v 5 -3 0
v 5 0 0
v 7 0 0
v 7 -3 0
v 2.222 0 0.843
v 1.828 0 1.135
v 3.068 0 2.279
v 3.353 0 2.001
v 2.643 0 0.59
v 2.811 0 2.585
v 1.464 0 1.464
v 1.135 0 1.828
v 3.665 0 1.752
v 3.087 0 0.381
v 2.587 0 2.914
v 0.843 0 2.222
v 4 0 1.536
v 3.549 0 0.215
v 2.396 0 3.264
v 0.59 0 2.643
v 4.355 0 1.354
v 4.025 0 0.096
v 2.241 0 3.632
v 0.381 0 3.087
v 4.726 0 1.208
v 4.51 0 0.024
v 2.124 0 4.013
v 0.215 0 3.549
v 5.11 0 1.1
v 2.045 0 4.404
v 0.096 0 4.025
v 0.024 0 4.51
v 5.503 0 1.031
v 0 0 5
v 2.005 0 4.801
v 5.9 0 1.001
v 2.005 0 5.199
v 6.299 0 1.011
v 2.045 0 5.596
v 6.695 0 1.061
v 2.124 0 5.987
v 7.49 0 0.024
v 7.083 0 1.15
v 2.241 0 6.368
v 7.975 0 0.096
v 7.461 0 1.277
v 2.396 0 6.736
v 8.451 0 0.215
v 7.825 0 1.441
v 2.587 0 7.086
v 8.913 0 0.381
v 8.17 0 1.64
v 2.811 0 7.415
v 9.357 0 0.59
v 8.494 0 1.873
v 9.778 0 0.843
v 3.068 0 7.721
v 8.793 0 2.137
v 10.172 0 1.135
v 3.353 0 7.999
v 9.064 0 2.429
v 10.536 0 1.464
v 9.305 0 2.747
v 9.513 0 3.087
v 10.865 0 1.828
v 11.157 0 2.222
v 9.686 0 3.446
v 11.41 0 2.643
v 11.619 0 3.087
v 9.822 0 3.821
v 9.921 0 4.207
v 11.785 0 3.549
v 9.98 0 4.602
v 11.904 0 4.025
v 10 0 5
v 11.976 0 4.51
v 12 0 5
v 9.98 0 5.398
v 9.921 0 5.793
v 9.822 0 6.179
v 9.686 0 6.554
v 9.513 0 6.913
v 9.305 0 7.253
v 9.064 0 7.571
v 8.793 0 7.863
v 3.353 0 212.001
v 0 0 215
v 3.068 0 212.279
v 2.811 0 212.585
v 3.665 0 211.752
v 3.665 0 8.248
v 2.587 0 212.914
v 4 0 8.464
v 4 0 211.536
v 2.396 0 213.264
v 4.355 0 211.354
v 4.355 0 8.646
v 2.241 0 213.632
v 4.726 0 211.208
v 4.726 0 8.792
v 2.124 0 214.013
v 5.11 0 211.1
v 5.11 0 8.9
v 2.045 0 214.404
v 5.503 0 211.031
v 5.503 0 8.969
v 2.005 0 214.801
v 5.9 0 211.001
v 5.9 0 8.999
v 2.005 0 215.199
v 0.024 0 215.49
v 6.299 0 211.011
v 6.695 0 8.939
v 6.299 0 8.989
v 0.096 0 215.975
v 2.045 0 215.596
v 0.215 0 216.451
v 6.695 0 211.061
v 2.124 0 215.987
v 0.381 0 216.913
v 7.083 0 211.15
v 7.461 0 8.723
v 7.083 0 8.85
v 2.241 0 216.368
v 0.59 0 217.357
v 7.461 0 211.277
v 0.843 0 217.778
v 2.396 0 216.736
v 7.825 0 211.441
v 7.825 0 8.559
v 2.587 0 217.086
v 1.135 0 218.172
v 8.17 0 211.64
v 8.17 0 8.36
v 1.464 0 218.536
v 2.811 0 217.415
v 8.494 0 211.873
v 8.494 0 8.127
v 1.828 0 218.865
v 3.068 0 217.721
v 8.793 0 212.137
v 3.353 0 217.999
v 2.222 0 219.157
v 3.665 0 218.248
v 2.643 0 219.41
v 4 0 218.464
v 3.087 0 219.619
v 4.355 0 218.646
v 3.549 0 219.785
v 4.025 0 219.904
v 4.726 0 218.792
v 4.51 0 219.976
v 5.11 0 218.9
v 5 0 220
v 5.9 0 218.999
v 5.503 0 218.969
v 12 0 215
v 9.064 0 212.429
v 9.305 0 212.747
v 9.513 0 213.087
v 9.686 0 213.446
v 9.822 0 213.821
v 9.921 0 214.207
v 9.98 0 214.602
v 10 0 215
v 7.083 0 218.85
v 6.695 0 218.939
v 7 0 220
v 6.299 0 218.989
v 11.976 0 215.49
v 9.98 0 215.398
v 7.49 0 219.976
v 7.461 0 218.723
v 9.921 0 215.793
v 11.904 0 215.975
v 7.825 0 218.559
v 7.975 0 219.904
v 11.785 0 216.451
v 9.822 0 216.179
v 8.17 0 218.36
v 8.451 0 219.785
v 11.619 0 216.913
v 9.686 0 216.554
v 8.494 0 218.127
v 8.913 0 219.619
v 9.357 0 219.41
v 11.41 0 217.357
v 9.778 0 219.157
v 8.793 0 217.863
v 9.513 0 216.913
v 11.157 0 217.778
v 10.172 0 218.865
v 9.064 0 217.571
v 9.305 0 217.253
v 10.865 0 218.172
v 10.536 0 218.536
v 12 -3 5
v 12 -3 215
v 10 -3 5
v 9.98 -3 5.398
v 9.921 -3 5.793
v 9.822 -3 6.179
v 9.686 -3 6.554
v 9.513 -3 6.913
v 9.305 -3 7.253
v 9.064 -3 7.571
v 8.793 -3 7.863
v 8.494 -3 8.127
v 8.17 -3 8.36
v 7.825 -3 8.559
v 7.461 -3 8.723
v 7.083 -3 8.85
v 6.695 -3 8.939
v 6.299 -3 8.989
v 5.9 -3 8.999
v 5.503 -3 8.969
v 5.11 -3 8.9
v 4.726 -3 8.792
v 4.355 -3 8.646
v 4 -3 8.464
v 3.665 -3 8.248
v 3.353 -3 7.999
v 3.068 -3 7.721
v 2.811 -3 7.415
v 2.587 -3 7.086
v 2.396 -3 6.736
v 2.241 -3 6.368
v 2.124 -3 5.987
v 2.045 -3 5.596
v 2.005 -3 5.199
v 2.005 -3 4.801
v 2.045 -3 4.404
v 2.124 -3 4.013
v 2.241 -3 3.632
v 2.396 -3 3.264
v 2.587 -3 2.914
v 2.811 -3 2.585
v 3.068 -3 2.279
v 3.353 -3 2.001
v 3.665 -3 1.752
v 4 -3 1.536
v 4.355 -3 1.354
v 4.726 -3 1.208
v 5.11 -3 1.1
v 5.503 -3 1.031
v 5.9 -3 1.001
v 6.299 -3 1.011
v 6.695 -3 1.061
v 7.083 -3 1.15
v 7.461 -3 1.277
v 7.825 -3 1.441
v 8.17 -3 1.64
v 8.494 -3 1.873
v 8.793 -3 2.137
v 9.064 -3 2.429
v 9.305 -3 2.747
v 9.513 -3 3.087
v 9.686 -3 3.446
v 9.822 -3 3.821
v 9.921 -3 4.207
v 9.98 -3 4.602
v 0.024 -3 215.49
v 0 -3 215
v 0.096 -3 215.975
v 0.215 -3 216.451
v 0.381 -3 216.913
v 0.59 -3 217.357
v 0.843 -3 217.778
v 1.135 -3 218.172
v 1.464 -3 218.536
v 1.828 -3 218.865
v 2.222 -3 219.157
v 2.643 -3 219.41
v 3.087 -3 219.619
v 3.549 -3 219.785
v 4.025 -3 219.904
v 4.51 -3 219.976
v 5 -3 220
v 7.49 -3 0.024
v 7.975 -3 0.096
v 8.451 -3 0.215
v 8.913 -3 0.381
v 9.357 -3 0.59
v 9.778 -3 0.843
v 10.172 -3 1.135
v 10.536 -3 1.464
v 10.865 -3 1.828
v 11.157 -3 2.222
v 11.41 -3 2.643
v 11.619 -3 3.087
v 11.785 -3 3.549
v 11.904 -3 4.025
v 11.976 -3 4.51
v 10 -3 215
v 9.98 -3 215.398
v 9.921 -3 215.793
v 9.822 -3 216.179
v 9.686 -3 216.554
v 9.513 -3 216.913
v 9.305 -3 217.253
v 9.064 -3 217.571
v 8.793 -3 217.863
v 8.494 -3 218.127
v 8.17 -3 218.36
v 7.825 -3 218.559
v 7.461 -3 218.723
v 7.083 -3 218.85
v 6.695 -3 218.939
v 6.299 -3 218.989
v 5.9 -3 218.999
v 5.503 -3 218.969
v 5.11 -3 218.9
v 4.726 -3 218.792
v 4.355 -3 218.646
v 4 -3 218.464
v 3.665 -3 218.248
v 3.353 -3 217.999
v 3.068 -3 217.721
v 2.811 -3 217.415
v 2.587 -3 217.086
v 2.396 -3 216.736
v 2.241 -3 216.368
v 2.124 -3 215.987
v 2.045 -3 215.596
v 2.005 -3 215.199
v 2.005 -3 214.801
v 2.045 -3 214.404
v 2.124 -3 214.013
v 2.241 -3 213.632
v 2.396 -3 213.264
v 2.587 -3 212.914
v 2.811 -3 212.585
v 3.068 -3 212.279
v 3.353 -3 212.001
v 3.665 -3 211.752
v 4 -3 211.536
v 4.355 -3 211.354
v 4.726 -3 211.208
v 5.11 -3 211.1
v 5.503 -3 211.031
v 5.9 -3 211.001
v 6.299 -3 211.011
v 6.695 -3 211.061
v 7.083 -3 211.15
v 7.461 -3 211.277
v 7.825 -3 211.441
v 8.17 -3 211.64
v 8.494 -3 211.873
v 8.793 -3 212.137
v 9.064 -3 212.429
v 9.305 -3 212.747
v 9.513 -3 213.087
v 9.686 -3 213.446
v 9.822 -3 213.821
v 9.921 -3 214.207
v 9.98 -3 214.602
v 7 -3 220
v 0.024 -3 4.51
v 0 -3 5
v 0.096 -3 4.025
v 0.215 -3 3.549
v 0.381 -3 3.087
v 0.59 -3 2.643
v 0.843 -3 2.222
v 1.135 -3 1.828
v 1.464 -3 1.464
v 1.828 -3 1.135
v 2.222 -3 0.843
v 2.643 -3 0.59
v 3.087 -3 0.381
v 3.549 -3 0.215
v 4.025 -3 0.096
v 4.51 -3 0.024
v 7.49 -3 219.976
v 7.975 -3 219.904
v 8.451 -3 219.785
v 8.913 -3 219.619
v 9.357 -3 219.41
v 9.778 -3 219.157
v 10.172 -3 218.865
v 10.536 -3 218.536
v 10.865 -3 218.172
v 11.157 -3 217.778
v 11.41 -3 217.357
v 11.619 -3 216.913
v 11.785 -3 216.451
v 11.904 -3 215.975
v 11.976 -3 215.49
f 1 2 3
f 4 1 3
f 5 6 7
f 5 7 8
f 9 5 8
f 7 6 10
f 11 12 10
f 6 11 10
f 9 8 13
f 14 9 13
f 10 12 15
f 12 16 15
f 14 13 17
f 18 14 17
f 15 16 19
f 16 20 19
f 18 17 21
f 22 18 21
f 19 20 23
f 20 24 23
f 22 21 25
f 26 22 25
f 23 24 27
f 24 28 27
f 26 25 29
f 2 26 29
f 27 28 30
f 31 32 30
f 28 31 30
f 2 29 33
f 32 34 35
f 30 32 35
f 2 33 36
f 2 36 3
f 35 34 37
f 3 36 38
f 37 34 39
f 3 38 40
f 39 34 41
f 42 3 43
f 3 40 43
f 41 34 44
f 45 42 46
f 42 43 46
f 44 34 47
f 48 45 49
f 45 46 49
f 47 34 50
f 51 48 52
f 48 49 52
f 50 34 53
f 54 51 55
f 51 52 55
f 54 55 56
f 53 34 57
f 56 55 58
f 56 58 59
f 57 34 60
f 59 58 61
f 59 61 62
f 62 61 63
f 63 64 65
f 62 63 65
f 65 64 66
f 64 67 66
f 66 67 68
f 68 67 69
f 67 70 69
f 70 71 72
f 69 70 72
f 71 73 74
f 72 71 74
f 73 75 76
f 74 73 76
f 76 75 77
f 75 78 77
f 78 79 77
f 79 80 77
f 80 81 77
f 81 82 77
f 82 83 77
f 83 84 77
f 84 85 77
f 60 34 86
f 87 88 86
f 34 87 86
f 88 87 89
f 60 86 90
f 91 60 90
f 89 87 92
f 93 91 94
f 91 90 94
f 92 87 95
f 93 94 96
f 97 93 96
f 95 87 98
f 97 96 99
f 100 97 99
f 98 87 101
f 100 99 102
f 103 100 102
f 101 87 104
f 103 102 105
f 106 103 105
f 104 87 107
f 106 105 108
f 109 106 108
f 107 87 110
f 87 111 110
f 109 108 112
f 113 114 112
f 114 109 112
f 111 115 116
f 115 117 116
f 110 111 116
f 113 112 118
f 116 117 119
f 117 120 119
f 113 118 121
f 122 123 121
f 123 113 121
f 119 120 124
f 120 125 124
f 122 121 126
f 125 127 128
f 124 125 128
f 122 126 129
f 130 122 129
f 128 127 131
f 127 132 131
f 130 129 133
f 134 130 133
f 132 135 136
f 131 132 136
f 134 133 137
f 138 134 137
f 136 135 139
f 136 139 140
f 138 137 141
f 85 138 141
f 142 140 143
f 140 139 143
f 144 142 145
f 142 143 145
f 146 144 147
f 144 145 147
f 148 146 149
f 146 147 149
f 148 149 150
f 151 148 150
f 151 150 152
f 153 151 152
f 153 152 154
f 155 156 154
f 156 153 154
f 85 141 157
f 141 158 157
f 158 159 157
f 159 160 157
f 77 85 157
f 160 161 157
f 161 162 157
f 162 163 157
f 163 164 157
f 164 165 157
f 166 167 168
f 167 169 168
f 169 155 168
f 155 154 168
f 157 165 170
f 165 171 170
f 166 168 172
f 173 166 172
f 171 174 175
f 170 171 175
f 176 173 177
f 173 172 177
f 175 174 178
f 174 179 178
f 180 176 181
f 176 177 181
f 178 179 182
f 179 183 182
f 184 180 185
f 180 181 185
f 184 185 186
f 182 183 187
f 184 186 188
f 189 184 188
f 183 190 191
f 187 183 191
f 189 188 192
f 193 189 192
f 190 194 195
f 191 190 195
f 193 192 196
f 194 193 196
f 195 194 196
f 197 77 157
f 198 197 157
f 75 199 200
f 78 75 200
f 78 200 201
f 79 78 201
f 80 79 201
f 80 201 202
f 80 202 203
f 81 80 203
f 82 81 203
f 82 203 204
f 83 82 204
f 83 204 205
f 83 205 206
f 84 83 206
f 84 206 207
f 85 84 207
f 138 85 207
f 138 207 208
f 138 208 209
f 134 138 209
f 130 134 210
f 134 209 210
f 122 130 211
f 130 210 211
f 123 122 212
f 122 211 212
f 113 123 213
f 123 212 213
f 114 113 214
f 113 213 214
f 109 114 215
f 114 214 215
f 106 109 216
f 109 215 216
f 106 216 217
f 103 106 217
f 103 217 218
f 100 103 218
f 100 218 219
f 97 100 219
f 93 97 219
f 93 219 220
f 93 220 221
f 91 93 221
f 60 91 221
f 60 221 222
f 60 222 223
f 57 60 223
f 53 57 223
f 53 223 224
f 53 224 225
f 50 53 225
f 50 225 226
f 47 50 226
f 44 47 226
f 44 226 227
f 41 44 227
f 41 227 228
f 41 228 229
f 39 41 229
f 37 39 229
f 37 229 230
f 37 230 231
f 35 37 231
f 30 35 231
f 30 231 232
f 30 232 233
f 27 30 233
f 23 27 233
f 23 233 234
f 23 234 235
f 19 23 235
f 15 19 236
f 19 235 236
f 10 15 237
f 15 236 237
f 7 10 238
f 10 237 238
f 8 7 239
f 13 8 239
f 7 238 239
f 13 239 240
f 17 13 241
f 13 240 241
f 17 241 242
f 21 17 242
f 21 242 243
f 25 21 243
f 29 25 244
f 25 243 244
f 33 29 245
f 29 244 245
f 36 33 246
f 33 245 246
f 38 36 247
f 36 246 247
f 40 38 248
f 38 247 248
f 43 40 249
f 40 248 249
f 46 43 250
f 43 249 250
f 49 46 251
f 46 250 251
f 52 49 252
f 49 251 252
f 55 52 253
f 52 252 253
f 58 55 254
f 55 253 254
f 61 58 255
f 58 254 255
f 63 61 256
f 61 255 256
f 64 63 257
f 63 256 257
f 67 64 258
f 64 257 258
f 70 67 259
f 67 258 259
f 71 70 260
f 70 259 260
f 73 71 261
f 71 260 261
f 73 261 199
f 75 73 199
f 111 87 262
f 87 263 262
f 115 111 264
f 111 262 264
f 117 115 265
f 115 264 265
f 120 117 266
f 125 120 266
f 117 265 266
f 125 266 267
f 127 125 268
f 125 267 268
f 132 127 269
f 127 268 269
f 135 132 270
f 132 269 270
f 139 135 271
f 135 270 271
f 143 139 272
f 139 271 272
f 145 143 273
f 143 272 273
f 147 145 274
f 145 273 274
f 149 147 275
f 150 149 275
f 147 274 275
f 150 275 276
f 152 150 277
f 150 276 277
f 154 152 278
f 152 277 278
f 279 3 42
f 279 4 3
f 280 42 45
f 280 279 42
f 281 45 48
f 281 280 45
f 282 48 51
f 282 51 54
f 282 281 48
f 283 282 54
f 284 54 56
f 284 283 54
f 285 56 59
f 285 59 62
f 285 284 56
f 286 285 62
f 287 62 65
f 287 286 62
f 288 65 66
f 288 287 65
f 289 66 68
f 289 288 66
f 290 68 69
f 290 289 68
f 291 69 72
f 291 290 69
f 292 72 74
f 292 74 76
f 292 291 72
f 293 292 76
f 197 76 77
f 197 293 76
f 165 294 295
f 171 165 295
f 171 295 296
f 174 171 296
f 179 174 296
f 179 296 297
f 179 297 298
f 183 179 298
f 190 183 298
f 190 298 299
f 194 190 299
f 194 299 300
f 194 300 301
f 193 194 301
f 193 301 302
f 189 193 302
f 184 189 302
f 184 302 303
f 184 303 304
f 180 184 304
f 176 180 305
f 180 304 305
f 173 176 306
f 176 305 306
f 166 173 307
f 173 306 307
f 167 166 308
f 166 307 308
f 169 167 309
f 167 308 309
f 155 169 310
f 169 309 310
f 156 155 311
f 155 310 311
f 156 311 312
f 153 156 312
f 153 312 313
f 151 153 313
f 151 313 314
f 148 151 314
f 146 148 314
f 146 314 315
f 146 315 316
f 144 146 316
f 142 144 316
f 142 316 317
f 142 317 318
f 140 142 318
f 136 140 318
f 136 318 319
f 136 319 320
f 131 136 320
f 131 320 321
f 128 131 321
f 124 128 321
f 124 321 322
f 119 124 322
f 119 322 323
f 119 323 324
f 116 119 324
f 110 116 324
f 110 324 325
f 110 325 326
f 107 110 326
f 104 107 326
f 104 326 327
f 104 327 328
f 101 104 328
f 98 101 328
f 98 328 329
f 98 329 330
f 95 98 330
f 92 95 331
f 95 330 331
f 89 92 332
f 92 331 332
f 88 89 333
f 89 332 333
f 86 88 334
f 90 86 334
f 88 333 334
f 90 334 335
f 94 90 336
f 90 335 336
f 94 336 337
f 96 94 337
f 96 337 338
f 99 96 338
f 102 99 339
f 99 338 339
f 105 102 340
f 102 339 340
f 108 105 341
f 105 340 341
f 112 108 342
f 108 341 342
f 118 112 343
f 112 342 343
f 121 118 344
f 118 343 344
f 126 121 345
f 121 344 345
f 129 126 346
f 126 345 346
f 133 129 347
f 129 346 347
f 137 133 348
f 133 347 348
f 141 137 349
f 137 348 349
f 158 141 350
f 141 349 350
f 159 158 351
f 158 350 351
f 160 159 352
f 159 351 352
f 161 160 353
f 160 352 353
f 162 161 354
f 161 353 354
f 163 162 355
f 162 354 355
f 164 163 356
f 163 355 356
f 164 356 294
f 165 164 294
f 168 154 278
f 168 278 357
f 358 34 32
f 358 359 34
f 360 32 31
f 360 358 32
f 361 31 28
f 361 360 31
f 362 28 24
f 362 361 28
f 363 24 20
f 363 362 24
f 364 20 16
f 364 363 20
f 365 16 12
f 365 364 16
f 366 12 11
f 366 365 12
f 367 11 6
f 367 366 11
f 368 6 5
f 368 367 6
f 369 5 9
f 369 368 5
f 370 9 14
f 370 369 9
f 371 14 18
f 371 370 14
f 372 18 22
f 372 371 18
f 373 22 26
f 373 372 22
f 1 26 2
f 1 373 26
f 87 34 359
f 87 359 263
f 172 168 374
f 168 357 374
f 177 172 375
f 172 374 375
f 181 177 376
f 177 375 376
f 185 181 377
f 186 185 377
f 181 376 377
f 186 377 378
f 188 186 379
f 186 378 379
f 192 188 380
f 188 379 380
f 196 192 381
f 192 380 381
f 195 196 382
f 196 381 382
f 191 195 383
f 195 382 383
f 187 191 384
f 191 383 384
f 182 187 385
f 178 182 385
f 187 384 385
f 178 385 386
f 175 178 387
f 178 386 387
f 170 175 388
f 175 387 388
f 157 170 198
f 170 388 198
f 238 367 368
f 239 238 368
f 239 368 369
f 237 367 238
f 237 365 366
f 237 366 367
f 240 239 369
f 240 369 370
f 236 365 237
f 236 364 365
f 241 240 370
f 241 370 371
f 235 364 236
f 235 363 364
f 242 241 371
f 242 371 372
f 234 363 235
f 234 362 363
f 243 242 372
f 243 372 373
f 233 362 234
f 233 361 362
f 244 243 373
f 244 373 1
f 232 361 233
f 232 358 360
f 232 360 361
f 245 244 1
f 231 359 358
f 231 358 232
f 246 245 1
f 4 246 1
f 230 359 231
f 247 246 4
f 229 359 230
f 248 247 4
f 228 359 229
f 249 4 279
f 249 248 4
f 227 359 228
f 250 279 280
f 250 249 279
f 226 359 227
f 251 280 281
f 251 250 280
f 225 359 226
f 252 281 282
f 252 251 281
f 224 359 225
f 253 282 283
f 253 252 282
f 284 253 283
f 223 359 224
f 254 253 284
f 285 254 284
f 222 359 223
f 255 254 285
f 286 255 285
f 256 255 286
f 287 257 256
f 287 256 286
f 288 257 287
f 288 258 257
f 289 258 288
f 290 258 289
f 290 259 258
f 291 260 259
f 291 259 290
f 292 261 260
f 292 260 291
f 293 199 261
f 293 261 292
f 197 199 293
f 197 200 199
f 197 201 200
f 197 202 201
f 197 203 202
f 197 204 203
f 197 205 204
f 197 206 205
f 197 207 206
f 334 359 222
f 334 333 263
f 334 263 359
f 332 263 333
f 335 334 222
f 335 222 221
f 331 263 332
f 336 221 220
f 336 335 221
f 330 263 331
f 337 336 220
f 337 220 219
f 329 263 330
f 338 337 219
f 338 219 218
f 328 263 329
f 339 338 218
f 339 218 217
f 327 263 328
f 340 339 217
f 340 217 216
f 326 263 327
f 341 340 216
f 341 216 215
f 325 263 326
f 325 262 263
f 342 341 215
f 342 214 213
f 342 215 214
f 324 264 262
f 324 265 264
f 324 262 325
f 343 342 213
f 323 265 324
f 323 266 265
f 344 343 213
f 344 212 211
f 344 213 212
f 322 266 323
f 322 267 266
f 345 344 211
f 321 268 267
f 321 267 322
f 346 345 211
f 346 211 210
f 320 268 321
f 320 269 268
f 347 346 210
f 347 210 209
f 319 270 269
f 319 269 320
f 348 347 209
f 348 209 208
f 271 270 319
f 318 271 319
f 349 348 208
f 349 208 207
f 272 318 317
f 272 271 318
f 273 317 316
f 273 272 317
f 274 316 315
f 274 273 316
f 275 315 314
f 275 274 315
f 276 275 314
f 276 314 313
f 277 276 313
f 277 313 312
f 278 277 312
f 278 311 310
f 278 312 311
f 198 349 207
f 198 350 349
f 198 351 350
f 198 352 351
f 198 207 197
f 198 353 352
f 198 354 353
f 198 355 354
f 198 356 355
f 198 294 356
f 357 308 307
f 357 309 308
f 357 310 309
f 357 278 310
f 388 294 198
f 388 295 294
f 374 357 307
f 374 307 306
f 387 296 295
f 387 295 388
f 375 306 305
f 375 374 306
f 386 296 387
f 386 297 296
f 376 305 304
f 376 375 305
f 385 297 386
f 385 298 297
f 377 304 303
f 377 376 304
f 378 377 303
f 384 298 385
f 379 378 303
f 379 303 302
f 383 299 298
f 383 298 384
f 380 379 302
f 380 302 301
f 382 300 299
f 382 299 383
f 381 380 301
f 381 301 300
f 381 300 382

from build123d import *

# Parameters (mm, degrees)
F0_W     = 12
F0_H     = 220
F1_DEPTH = 3
F2_R     = 5
F3_R     = 5
F4_R     = 5
F5_R     = 5
F6_R     = 4
F7_DEPTH = 25


with BuildPart() as f1:
    # F0 (on Front) → F1 (new body)
    with BuildSketch(Plane.XZ):
        with Locations((6, 110)):
            Rectangle(F0_W, F0_H)
    extrude(amount=F1_DEPTH)

    # F2
    f2_edges = [f1.edges().sort_by_distance(p)[0] for p in [
        (0, -1.5, 220),
    ]]
    fillet(f2_edges, radius=F2_R)

    # F3
    f3_edges = [f1.edges().sort_by_distance(p)[0] for p in [
        (12, -1.5, 220),
    ]]
    fillet(f3_edges, radius=F3_R)

    # F4
    f4_edges = [f1.edges().sort_by_distance(p)[0] for p in [
        (0, -1.5, 0),
    ]]
    fillet(f4_edges, radius=F4_R)

    # F5
    f5_edges = [f1.edges().sort_by_distance(p)[0] for p in [
        (12, -1.5, 0),
    ]]
    fillet(f5_edges, radius=F5_R)

    # F6 (on face) → F7 (cut)
    with BuildSketch(Plane.XZ.offset(3)):
        with Locations((6, 215)):
            Circle(F6_R)
        with Locations((6, 5)):
            Circle(F6_R)
    extrude(amount=-F7_DEPTH, mode=Mode.SUBTRACT)


solid = f1.part
